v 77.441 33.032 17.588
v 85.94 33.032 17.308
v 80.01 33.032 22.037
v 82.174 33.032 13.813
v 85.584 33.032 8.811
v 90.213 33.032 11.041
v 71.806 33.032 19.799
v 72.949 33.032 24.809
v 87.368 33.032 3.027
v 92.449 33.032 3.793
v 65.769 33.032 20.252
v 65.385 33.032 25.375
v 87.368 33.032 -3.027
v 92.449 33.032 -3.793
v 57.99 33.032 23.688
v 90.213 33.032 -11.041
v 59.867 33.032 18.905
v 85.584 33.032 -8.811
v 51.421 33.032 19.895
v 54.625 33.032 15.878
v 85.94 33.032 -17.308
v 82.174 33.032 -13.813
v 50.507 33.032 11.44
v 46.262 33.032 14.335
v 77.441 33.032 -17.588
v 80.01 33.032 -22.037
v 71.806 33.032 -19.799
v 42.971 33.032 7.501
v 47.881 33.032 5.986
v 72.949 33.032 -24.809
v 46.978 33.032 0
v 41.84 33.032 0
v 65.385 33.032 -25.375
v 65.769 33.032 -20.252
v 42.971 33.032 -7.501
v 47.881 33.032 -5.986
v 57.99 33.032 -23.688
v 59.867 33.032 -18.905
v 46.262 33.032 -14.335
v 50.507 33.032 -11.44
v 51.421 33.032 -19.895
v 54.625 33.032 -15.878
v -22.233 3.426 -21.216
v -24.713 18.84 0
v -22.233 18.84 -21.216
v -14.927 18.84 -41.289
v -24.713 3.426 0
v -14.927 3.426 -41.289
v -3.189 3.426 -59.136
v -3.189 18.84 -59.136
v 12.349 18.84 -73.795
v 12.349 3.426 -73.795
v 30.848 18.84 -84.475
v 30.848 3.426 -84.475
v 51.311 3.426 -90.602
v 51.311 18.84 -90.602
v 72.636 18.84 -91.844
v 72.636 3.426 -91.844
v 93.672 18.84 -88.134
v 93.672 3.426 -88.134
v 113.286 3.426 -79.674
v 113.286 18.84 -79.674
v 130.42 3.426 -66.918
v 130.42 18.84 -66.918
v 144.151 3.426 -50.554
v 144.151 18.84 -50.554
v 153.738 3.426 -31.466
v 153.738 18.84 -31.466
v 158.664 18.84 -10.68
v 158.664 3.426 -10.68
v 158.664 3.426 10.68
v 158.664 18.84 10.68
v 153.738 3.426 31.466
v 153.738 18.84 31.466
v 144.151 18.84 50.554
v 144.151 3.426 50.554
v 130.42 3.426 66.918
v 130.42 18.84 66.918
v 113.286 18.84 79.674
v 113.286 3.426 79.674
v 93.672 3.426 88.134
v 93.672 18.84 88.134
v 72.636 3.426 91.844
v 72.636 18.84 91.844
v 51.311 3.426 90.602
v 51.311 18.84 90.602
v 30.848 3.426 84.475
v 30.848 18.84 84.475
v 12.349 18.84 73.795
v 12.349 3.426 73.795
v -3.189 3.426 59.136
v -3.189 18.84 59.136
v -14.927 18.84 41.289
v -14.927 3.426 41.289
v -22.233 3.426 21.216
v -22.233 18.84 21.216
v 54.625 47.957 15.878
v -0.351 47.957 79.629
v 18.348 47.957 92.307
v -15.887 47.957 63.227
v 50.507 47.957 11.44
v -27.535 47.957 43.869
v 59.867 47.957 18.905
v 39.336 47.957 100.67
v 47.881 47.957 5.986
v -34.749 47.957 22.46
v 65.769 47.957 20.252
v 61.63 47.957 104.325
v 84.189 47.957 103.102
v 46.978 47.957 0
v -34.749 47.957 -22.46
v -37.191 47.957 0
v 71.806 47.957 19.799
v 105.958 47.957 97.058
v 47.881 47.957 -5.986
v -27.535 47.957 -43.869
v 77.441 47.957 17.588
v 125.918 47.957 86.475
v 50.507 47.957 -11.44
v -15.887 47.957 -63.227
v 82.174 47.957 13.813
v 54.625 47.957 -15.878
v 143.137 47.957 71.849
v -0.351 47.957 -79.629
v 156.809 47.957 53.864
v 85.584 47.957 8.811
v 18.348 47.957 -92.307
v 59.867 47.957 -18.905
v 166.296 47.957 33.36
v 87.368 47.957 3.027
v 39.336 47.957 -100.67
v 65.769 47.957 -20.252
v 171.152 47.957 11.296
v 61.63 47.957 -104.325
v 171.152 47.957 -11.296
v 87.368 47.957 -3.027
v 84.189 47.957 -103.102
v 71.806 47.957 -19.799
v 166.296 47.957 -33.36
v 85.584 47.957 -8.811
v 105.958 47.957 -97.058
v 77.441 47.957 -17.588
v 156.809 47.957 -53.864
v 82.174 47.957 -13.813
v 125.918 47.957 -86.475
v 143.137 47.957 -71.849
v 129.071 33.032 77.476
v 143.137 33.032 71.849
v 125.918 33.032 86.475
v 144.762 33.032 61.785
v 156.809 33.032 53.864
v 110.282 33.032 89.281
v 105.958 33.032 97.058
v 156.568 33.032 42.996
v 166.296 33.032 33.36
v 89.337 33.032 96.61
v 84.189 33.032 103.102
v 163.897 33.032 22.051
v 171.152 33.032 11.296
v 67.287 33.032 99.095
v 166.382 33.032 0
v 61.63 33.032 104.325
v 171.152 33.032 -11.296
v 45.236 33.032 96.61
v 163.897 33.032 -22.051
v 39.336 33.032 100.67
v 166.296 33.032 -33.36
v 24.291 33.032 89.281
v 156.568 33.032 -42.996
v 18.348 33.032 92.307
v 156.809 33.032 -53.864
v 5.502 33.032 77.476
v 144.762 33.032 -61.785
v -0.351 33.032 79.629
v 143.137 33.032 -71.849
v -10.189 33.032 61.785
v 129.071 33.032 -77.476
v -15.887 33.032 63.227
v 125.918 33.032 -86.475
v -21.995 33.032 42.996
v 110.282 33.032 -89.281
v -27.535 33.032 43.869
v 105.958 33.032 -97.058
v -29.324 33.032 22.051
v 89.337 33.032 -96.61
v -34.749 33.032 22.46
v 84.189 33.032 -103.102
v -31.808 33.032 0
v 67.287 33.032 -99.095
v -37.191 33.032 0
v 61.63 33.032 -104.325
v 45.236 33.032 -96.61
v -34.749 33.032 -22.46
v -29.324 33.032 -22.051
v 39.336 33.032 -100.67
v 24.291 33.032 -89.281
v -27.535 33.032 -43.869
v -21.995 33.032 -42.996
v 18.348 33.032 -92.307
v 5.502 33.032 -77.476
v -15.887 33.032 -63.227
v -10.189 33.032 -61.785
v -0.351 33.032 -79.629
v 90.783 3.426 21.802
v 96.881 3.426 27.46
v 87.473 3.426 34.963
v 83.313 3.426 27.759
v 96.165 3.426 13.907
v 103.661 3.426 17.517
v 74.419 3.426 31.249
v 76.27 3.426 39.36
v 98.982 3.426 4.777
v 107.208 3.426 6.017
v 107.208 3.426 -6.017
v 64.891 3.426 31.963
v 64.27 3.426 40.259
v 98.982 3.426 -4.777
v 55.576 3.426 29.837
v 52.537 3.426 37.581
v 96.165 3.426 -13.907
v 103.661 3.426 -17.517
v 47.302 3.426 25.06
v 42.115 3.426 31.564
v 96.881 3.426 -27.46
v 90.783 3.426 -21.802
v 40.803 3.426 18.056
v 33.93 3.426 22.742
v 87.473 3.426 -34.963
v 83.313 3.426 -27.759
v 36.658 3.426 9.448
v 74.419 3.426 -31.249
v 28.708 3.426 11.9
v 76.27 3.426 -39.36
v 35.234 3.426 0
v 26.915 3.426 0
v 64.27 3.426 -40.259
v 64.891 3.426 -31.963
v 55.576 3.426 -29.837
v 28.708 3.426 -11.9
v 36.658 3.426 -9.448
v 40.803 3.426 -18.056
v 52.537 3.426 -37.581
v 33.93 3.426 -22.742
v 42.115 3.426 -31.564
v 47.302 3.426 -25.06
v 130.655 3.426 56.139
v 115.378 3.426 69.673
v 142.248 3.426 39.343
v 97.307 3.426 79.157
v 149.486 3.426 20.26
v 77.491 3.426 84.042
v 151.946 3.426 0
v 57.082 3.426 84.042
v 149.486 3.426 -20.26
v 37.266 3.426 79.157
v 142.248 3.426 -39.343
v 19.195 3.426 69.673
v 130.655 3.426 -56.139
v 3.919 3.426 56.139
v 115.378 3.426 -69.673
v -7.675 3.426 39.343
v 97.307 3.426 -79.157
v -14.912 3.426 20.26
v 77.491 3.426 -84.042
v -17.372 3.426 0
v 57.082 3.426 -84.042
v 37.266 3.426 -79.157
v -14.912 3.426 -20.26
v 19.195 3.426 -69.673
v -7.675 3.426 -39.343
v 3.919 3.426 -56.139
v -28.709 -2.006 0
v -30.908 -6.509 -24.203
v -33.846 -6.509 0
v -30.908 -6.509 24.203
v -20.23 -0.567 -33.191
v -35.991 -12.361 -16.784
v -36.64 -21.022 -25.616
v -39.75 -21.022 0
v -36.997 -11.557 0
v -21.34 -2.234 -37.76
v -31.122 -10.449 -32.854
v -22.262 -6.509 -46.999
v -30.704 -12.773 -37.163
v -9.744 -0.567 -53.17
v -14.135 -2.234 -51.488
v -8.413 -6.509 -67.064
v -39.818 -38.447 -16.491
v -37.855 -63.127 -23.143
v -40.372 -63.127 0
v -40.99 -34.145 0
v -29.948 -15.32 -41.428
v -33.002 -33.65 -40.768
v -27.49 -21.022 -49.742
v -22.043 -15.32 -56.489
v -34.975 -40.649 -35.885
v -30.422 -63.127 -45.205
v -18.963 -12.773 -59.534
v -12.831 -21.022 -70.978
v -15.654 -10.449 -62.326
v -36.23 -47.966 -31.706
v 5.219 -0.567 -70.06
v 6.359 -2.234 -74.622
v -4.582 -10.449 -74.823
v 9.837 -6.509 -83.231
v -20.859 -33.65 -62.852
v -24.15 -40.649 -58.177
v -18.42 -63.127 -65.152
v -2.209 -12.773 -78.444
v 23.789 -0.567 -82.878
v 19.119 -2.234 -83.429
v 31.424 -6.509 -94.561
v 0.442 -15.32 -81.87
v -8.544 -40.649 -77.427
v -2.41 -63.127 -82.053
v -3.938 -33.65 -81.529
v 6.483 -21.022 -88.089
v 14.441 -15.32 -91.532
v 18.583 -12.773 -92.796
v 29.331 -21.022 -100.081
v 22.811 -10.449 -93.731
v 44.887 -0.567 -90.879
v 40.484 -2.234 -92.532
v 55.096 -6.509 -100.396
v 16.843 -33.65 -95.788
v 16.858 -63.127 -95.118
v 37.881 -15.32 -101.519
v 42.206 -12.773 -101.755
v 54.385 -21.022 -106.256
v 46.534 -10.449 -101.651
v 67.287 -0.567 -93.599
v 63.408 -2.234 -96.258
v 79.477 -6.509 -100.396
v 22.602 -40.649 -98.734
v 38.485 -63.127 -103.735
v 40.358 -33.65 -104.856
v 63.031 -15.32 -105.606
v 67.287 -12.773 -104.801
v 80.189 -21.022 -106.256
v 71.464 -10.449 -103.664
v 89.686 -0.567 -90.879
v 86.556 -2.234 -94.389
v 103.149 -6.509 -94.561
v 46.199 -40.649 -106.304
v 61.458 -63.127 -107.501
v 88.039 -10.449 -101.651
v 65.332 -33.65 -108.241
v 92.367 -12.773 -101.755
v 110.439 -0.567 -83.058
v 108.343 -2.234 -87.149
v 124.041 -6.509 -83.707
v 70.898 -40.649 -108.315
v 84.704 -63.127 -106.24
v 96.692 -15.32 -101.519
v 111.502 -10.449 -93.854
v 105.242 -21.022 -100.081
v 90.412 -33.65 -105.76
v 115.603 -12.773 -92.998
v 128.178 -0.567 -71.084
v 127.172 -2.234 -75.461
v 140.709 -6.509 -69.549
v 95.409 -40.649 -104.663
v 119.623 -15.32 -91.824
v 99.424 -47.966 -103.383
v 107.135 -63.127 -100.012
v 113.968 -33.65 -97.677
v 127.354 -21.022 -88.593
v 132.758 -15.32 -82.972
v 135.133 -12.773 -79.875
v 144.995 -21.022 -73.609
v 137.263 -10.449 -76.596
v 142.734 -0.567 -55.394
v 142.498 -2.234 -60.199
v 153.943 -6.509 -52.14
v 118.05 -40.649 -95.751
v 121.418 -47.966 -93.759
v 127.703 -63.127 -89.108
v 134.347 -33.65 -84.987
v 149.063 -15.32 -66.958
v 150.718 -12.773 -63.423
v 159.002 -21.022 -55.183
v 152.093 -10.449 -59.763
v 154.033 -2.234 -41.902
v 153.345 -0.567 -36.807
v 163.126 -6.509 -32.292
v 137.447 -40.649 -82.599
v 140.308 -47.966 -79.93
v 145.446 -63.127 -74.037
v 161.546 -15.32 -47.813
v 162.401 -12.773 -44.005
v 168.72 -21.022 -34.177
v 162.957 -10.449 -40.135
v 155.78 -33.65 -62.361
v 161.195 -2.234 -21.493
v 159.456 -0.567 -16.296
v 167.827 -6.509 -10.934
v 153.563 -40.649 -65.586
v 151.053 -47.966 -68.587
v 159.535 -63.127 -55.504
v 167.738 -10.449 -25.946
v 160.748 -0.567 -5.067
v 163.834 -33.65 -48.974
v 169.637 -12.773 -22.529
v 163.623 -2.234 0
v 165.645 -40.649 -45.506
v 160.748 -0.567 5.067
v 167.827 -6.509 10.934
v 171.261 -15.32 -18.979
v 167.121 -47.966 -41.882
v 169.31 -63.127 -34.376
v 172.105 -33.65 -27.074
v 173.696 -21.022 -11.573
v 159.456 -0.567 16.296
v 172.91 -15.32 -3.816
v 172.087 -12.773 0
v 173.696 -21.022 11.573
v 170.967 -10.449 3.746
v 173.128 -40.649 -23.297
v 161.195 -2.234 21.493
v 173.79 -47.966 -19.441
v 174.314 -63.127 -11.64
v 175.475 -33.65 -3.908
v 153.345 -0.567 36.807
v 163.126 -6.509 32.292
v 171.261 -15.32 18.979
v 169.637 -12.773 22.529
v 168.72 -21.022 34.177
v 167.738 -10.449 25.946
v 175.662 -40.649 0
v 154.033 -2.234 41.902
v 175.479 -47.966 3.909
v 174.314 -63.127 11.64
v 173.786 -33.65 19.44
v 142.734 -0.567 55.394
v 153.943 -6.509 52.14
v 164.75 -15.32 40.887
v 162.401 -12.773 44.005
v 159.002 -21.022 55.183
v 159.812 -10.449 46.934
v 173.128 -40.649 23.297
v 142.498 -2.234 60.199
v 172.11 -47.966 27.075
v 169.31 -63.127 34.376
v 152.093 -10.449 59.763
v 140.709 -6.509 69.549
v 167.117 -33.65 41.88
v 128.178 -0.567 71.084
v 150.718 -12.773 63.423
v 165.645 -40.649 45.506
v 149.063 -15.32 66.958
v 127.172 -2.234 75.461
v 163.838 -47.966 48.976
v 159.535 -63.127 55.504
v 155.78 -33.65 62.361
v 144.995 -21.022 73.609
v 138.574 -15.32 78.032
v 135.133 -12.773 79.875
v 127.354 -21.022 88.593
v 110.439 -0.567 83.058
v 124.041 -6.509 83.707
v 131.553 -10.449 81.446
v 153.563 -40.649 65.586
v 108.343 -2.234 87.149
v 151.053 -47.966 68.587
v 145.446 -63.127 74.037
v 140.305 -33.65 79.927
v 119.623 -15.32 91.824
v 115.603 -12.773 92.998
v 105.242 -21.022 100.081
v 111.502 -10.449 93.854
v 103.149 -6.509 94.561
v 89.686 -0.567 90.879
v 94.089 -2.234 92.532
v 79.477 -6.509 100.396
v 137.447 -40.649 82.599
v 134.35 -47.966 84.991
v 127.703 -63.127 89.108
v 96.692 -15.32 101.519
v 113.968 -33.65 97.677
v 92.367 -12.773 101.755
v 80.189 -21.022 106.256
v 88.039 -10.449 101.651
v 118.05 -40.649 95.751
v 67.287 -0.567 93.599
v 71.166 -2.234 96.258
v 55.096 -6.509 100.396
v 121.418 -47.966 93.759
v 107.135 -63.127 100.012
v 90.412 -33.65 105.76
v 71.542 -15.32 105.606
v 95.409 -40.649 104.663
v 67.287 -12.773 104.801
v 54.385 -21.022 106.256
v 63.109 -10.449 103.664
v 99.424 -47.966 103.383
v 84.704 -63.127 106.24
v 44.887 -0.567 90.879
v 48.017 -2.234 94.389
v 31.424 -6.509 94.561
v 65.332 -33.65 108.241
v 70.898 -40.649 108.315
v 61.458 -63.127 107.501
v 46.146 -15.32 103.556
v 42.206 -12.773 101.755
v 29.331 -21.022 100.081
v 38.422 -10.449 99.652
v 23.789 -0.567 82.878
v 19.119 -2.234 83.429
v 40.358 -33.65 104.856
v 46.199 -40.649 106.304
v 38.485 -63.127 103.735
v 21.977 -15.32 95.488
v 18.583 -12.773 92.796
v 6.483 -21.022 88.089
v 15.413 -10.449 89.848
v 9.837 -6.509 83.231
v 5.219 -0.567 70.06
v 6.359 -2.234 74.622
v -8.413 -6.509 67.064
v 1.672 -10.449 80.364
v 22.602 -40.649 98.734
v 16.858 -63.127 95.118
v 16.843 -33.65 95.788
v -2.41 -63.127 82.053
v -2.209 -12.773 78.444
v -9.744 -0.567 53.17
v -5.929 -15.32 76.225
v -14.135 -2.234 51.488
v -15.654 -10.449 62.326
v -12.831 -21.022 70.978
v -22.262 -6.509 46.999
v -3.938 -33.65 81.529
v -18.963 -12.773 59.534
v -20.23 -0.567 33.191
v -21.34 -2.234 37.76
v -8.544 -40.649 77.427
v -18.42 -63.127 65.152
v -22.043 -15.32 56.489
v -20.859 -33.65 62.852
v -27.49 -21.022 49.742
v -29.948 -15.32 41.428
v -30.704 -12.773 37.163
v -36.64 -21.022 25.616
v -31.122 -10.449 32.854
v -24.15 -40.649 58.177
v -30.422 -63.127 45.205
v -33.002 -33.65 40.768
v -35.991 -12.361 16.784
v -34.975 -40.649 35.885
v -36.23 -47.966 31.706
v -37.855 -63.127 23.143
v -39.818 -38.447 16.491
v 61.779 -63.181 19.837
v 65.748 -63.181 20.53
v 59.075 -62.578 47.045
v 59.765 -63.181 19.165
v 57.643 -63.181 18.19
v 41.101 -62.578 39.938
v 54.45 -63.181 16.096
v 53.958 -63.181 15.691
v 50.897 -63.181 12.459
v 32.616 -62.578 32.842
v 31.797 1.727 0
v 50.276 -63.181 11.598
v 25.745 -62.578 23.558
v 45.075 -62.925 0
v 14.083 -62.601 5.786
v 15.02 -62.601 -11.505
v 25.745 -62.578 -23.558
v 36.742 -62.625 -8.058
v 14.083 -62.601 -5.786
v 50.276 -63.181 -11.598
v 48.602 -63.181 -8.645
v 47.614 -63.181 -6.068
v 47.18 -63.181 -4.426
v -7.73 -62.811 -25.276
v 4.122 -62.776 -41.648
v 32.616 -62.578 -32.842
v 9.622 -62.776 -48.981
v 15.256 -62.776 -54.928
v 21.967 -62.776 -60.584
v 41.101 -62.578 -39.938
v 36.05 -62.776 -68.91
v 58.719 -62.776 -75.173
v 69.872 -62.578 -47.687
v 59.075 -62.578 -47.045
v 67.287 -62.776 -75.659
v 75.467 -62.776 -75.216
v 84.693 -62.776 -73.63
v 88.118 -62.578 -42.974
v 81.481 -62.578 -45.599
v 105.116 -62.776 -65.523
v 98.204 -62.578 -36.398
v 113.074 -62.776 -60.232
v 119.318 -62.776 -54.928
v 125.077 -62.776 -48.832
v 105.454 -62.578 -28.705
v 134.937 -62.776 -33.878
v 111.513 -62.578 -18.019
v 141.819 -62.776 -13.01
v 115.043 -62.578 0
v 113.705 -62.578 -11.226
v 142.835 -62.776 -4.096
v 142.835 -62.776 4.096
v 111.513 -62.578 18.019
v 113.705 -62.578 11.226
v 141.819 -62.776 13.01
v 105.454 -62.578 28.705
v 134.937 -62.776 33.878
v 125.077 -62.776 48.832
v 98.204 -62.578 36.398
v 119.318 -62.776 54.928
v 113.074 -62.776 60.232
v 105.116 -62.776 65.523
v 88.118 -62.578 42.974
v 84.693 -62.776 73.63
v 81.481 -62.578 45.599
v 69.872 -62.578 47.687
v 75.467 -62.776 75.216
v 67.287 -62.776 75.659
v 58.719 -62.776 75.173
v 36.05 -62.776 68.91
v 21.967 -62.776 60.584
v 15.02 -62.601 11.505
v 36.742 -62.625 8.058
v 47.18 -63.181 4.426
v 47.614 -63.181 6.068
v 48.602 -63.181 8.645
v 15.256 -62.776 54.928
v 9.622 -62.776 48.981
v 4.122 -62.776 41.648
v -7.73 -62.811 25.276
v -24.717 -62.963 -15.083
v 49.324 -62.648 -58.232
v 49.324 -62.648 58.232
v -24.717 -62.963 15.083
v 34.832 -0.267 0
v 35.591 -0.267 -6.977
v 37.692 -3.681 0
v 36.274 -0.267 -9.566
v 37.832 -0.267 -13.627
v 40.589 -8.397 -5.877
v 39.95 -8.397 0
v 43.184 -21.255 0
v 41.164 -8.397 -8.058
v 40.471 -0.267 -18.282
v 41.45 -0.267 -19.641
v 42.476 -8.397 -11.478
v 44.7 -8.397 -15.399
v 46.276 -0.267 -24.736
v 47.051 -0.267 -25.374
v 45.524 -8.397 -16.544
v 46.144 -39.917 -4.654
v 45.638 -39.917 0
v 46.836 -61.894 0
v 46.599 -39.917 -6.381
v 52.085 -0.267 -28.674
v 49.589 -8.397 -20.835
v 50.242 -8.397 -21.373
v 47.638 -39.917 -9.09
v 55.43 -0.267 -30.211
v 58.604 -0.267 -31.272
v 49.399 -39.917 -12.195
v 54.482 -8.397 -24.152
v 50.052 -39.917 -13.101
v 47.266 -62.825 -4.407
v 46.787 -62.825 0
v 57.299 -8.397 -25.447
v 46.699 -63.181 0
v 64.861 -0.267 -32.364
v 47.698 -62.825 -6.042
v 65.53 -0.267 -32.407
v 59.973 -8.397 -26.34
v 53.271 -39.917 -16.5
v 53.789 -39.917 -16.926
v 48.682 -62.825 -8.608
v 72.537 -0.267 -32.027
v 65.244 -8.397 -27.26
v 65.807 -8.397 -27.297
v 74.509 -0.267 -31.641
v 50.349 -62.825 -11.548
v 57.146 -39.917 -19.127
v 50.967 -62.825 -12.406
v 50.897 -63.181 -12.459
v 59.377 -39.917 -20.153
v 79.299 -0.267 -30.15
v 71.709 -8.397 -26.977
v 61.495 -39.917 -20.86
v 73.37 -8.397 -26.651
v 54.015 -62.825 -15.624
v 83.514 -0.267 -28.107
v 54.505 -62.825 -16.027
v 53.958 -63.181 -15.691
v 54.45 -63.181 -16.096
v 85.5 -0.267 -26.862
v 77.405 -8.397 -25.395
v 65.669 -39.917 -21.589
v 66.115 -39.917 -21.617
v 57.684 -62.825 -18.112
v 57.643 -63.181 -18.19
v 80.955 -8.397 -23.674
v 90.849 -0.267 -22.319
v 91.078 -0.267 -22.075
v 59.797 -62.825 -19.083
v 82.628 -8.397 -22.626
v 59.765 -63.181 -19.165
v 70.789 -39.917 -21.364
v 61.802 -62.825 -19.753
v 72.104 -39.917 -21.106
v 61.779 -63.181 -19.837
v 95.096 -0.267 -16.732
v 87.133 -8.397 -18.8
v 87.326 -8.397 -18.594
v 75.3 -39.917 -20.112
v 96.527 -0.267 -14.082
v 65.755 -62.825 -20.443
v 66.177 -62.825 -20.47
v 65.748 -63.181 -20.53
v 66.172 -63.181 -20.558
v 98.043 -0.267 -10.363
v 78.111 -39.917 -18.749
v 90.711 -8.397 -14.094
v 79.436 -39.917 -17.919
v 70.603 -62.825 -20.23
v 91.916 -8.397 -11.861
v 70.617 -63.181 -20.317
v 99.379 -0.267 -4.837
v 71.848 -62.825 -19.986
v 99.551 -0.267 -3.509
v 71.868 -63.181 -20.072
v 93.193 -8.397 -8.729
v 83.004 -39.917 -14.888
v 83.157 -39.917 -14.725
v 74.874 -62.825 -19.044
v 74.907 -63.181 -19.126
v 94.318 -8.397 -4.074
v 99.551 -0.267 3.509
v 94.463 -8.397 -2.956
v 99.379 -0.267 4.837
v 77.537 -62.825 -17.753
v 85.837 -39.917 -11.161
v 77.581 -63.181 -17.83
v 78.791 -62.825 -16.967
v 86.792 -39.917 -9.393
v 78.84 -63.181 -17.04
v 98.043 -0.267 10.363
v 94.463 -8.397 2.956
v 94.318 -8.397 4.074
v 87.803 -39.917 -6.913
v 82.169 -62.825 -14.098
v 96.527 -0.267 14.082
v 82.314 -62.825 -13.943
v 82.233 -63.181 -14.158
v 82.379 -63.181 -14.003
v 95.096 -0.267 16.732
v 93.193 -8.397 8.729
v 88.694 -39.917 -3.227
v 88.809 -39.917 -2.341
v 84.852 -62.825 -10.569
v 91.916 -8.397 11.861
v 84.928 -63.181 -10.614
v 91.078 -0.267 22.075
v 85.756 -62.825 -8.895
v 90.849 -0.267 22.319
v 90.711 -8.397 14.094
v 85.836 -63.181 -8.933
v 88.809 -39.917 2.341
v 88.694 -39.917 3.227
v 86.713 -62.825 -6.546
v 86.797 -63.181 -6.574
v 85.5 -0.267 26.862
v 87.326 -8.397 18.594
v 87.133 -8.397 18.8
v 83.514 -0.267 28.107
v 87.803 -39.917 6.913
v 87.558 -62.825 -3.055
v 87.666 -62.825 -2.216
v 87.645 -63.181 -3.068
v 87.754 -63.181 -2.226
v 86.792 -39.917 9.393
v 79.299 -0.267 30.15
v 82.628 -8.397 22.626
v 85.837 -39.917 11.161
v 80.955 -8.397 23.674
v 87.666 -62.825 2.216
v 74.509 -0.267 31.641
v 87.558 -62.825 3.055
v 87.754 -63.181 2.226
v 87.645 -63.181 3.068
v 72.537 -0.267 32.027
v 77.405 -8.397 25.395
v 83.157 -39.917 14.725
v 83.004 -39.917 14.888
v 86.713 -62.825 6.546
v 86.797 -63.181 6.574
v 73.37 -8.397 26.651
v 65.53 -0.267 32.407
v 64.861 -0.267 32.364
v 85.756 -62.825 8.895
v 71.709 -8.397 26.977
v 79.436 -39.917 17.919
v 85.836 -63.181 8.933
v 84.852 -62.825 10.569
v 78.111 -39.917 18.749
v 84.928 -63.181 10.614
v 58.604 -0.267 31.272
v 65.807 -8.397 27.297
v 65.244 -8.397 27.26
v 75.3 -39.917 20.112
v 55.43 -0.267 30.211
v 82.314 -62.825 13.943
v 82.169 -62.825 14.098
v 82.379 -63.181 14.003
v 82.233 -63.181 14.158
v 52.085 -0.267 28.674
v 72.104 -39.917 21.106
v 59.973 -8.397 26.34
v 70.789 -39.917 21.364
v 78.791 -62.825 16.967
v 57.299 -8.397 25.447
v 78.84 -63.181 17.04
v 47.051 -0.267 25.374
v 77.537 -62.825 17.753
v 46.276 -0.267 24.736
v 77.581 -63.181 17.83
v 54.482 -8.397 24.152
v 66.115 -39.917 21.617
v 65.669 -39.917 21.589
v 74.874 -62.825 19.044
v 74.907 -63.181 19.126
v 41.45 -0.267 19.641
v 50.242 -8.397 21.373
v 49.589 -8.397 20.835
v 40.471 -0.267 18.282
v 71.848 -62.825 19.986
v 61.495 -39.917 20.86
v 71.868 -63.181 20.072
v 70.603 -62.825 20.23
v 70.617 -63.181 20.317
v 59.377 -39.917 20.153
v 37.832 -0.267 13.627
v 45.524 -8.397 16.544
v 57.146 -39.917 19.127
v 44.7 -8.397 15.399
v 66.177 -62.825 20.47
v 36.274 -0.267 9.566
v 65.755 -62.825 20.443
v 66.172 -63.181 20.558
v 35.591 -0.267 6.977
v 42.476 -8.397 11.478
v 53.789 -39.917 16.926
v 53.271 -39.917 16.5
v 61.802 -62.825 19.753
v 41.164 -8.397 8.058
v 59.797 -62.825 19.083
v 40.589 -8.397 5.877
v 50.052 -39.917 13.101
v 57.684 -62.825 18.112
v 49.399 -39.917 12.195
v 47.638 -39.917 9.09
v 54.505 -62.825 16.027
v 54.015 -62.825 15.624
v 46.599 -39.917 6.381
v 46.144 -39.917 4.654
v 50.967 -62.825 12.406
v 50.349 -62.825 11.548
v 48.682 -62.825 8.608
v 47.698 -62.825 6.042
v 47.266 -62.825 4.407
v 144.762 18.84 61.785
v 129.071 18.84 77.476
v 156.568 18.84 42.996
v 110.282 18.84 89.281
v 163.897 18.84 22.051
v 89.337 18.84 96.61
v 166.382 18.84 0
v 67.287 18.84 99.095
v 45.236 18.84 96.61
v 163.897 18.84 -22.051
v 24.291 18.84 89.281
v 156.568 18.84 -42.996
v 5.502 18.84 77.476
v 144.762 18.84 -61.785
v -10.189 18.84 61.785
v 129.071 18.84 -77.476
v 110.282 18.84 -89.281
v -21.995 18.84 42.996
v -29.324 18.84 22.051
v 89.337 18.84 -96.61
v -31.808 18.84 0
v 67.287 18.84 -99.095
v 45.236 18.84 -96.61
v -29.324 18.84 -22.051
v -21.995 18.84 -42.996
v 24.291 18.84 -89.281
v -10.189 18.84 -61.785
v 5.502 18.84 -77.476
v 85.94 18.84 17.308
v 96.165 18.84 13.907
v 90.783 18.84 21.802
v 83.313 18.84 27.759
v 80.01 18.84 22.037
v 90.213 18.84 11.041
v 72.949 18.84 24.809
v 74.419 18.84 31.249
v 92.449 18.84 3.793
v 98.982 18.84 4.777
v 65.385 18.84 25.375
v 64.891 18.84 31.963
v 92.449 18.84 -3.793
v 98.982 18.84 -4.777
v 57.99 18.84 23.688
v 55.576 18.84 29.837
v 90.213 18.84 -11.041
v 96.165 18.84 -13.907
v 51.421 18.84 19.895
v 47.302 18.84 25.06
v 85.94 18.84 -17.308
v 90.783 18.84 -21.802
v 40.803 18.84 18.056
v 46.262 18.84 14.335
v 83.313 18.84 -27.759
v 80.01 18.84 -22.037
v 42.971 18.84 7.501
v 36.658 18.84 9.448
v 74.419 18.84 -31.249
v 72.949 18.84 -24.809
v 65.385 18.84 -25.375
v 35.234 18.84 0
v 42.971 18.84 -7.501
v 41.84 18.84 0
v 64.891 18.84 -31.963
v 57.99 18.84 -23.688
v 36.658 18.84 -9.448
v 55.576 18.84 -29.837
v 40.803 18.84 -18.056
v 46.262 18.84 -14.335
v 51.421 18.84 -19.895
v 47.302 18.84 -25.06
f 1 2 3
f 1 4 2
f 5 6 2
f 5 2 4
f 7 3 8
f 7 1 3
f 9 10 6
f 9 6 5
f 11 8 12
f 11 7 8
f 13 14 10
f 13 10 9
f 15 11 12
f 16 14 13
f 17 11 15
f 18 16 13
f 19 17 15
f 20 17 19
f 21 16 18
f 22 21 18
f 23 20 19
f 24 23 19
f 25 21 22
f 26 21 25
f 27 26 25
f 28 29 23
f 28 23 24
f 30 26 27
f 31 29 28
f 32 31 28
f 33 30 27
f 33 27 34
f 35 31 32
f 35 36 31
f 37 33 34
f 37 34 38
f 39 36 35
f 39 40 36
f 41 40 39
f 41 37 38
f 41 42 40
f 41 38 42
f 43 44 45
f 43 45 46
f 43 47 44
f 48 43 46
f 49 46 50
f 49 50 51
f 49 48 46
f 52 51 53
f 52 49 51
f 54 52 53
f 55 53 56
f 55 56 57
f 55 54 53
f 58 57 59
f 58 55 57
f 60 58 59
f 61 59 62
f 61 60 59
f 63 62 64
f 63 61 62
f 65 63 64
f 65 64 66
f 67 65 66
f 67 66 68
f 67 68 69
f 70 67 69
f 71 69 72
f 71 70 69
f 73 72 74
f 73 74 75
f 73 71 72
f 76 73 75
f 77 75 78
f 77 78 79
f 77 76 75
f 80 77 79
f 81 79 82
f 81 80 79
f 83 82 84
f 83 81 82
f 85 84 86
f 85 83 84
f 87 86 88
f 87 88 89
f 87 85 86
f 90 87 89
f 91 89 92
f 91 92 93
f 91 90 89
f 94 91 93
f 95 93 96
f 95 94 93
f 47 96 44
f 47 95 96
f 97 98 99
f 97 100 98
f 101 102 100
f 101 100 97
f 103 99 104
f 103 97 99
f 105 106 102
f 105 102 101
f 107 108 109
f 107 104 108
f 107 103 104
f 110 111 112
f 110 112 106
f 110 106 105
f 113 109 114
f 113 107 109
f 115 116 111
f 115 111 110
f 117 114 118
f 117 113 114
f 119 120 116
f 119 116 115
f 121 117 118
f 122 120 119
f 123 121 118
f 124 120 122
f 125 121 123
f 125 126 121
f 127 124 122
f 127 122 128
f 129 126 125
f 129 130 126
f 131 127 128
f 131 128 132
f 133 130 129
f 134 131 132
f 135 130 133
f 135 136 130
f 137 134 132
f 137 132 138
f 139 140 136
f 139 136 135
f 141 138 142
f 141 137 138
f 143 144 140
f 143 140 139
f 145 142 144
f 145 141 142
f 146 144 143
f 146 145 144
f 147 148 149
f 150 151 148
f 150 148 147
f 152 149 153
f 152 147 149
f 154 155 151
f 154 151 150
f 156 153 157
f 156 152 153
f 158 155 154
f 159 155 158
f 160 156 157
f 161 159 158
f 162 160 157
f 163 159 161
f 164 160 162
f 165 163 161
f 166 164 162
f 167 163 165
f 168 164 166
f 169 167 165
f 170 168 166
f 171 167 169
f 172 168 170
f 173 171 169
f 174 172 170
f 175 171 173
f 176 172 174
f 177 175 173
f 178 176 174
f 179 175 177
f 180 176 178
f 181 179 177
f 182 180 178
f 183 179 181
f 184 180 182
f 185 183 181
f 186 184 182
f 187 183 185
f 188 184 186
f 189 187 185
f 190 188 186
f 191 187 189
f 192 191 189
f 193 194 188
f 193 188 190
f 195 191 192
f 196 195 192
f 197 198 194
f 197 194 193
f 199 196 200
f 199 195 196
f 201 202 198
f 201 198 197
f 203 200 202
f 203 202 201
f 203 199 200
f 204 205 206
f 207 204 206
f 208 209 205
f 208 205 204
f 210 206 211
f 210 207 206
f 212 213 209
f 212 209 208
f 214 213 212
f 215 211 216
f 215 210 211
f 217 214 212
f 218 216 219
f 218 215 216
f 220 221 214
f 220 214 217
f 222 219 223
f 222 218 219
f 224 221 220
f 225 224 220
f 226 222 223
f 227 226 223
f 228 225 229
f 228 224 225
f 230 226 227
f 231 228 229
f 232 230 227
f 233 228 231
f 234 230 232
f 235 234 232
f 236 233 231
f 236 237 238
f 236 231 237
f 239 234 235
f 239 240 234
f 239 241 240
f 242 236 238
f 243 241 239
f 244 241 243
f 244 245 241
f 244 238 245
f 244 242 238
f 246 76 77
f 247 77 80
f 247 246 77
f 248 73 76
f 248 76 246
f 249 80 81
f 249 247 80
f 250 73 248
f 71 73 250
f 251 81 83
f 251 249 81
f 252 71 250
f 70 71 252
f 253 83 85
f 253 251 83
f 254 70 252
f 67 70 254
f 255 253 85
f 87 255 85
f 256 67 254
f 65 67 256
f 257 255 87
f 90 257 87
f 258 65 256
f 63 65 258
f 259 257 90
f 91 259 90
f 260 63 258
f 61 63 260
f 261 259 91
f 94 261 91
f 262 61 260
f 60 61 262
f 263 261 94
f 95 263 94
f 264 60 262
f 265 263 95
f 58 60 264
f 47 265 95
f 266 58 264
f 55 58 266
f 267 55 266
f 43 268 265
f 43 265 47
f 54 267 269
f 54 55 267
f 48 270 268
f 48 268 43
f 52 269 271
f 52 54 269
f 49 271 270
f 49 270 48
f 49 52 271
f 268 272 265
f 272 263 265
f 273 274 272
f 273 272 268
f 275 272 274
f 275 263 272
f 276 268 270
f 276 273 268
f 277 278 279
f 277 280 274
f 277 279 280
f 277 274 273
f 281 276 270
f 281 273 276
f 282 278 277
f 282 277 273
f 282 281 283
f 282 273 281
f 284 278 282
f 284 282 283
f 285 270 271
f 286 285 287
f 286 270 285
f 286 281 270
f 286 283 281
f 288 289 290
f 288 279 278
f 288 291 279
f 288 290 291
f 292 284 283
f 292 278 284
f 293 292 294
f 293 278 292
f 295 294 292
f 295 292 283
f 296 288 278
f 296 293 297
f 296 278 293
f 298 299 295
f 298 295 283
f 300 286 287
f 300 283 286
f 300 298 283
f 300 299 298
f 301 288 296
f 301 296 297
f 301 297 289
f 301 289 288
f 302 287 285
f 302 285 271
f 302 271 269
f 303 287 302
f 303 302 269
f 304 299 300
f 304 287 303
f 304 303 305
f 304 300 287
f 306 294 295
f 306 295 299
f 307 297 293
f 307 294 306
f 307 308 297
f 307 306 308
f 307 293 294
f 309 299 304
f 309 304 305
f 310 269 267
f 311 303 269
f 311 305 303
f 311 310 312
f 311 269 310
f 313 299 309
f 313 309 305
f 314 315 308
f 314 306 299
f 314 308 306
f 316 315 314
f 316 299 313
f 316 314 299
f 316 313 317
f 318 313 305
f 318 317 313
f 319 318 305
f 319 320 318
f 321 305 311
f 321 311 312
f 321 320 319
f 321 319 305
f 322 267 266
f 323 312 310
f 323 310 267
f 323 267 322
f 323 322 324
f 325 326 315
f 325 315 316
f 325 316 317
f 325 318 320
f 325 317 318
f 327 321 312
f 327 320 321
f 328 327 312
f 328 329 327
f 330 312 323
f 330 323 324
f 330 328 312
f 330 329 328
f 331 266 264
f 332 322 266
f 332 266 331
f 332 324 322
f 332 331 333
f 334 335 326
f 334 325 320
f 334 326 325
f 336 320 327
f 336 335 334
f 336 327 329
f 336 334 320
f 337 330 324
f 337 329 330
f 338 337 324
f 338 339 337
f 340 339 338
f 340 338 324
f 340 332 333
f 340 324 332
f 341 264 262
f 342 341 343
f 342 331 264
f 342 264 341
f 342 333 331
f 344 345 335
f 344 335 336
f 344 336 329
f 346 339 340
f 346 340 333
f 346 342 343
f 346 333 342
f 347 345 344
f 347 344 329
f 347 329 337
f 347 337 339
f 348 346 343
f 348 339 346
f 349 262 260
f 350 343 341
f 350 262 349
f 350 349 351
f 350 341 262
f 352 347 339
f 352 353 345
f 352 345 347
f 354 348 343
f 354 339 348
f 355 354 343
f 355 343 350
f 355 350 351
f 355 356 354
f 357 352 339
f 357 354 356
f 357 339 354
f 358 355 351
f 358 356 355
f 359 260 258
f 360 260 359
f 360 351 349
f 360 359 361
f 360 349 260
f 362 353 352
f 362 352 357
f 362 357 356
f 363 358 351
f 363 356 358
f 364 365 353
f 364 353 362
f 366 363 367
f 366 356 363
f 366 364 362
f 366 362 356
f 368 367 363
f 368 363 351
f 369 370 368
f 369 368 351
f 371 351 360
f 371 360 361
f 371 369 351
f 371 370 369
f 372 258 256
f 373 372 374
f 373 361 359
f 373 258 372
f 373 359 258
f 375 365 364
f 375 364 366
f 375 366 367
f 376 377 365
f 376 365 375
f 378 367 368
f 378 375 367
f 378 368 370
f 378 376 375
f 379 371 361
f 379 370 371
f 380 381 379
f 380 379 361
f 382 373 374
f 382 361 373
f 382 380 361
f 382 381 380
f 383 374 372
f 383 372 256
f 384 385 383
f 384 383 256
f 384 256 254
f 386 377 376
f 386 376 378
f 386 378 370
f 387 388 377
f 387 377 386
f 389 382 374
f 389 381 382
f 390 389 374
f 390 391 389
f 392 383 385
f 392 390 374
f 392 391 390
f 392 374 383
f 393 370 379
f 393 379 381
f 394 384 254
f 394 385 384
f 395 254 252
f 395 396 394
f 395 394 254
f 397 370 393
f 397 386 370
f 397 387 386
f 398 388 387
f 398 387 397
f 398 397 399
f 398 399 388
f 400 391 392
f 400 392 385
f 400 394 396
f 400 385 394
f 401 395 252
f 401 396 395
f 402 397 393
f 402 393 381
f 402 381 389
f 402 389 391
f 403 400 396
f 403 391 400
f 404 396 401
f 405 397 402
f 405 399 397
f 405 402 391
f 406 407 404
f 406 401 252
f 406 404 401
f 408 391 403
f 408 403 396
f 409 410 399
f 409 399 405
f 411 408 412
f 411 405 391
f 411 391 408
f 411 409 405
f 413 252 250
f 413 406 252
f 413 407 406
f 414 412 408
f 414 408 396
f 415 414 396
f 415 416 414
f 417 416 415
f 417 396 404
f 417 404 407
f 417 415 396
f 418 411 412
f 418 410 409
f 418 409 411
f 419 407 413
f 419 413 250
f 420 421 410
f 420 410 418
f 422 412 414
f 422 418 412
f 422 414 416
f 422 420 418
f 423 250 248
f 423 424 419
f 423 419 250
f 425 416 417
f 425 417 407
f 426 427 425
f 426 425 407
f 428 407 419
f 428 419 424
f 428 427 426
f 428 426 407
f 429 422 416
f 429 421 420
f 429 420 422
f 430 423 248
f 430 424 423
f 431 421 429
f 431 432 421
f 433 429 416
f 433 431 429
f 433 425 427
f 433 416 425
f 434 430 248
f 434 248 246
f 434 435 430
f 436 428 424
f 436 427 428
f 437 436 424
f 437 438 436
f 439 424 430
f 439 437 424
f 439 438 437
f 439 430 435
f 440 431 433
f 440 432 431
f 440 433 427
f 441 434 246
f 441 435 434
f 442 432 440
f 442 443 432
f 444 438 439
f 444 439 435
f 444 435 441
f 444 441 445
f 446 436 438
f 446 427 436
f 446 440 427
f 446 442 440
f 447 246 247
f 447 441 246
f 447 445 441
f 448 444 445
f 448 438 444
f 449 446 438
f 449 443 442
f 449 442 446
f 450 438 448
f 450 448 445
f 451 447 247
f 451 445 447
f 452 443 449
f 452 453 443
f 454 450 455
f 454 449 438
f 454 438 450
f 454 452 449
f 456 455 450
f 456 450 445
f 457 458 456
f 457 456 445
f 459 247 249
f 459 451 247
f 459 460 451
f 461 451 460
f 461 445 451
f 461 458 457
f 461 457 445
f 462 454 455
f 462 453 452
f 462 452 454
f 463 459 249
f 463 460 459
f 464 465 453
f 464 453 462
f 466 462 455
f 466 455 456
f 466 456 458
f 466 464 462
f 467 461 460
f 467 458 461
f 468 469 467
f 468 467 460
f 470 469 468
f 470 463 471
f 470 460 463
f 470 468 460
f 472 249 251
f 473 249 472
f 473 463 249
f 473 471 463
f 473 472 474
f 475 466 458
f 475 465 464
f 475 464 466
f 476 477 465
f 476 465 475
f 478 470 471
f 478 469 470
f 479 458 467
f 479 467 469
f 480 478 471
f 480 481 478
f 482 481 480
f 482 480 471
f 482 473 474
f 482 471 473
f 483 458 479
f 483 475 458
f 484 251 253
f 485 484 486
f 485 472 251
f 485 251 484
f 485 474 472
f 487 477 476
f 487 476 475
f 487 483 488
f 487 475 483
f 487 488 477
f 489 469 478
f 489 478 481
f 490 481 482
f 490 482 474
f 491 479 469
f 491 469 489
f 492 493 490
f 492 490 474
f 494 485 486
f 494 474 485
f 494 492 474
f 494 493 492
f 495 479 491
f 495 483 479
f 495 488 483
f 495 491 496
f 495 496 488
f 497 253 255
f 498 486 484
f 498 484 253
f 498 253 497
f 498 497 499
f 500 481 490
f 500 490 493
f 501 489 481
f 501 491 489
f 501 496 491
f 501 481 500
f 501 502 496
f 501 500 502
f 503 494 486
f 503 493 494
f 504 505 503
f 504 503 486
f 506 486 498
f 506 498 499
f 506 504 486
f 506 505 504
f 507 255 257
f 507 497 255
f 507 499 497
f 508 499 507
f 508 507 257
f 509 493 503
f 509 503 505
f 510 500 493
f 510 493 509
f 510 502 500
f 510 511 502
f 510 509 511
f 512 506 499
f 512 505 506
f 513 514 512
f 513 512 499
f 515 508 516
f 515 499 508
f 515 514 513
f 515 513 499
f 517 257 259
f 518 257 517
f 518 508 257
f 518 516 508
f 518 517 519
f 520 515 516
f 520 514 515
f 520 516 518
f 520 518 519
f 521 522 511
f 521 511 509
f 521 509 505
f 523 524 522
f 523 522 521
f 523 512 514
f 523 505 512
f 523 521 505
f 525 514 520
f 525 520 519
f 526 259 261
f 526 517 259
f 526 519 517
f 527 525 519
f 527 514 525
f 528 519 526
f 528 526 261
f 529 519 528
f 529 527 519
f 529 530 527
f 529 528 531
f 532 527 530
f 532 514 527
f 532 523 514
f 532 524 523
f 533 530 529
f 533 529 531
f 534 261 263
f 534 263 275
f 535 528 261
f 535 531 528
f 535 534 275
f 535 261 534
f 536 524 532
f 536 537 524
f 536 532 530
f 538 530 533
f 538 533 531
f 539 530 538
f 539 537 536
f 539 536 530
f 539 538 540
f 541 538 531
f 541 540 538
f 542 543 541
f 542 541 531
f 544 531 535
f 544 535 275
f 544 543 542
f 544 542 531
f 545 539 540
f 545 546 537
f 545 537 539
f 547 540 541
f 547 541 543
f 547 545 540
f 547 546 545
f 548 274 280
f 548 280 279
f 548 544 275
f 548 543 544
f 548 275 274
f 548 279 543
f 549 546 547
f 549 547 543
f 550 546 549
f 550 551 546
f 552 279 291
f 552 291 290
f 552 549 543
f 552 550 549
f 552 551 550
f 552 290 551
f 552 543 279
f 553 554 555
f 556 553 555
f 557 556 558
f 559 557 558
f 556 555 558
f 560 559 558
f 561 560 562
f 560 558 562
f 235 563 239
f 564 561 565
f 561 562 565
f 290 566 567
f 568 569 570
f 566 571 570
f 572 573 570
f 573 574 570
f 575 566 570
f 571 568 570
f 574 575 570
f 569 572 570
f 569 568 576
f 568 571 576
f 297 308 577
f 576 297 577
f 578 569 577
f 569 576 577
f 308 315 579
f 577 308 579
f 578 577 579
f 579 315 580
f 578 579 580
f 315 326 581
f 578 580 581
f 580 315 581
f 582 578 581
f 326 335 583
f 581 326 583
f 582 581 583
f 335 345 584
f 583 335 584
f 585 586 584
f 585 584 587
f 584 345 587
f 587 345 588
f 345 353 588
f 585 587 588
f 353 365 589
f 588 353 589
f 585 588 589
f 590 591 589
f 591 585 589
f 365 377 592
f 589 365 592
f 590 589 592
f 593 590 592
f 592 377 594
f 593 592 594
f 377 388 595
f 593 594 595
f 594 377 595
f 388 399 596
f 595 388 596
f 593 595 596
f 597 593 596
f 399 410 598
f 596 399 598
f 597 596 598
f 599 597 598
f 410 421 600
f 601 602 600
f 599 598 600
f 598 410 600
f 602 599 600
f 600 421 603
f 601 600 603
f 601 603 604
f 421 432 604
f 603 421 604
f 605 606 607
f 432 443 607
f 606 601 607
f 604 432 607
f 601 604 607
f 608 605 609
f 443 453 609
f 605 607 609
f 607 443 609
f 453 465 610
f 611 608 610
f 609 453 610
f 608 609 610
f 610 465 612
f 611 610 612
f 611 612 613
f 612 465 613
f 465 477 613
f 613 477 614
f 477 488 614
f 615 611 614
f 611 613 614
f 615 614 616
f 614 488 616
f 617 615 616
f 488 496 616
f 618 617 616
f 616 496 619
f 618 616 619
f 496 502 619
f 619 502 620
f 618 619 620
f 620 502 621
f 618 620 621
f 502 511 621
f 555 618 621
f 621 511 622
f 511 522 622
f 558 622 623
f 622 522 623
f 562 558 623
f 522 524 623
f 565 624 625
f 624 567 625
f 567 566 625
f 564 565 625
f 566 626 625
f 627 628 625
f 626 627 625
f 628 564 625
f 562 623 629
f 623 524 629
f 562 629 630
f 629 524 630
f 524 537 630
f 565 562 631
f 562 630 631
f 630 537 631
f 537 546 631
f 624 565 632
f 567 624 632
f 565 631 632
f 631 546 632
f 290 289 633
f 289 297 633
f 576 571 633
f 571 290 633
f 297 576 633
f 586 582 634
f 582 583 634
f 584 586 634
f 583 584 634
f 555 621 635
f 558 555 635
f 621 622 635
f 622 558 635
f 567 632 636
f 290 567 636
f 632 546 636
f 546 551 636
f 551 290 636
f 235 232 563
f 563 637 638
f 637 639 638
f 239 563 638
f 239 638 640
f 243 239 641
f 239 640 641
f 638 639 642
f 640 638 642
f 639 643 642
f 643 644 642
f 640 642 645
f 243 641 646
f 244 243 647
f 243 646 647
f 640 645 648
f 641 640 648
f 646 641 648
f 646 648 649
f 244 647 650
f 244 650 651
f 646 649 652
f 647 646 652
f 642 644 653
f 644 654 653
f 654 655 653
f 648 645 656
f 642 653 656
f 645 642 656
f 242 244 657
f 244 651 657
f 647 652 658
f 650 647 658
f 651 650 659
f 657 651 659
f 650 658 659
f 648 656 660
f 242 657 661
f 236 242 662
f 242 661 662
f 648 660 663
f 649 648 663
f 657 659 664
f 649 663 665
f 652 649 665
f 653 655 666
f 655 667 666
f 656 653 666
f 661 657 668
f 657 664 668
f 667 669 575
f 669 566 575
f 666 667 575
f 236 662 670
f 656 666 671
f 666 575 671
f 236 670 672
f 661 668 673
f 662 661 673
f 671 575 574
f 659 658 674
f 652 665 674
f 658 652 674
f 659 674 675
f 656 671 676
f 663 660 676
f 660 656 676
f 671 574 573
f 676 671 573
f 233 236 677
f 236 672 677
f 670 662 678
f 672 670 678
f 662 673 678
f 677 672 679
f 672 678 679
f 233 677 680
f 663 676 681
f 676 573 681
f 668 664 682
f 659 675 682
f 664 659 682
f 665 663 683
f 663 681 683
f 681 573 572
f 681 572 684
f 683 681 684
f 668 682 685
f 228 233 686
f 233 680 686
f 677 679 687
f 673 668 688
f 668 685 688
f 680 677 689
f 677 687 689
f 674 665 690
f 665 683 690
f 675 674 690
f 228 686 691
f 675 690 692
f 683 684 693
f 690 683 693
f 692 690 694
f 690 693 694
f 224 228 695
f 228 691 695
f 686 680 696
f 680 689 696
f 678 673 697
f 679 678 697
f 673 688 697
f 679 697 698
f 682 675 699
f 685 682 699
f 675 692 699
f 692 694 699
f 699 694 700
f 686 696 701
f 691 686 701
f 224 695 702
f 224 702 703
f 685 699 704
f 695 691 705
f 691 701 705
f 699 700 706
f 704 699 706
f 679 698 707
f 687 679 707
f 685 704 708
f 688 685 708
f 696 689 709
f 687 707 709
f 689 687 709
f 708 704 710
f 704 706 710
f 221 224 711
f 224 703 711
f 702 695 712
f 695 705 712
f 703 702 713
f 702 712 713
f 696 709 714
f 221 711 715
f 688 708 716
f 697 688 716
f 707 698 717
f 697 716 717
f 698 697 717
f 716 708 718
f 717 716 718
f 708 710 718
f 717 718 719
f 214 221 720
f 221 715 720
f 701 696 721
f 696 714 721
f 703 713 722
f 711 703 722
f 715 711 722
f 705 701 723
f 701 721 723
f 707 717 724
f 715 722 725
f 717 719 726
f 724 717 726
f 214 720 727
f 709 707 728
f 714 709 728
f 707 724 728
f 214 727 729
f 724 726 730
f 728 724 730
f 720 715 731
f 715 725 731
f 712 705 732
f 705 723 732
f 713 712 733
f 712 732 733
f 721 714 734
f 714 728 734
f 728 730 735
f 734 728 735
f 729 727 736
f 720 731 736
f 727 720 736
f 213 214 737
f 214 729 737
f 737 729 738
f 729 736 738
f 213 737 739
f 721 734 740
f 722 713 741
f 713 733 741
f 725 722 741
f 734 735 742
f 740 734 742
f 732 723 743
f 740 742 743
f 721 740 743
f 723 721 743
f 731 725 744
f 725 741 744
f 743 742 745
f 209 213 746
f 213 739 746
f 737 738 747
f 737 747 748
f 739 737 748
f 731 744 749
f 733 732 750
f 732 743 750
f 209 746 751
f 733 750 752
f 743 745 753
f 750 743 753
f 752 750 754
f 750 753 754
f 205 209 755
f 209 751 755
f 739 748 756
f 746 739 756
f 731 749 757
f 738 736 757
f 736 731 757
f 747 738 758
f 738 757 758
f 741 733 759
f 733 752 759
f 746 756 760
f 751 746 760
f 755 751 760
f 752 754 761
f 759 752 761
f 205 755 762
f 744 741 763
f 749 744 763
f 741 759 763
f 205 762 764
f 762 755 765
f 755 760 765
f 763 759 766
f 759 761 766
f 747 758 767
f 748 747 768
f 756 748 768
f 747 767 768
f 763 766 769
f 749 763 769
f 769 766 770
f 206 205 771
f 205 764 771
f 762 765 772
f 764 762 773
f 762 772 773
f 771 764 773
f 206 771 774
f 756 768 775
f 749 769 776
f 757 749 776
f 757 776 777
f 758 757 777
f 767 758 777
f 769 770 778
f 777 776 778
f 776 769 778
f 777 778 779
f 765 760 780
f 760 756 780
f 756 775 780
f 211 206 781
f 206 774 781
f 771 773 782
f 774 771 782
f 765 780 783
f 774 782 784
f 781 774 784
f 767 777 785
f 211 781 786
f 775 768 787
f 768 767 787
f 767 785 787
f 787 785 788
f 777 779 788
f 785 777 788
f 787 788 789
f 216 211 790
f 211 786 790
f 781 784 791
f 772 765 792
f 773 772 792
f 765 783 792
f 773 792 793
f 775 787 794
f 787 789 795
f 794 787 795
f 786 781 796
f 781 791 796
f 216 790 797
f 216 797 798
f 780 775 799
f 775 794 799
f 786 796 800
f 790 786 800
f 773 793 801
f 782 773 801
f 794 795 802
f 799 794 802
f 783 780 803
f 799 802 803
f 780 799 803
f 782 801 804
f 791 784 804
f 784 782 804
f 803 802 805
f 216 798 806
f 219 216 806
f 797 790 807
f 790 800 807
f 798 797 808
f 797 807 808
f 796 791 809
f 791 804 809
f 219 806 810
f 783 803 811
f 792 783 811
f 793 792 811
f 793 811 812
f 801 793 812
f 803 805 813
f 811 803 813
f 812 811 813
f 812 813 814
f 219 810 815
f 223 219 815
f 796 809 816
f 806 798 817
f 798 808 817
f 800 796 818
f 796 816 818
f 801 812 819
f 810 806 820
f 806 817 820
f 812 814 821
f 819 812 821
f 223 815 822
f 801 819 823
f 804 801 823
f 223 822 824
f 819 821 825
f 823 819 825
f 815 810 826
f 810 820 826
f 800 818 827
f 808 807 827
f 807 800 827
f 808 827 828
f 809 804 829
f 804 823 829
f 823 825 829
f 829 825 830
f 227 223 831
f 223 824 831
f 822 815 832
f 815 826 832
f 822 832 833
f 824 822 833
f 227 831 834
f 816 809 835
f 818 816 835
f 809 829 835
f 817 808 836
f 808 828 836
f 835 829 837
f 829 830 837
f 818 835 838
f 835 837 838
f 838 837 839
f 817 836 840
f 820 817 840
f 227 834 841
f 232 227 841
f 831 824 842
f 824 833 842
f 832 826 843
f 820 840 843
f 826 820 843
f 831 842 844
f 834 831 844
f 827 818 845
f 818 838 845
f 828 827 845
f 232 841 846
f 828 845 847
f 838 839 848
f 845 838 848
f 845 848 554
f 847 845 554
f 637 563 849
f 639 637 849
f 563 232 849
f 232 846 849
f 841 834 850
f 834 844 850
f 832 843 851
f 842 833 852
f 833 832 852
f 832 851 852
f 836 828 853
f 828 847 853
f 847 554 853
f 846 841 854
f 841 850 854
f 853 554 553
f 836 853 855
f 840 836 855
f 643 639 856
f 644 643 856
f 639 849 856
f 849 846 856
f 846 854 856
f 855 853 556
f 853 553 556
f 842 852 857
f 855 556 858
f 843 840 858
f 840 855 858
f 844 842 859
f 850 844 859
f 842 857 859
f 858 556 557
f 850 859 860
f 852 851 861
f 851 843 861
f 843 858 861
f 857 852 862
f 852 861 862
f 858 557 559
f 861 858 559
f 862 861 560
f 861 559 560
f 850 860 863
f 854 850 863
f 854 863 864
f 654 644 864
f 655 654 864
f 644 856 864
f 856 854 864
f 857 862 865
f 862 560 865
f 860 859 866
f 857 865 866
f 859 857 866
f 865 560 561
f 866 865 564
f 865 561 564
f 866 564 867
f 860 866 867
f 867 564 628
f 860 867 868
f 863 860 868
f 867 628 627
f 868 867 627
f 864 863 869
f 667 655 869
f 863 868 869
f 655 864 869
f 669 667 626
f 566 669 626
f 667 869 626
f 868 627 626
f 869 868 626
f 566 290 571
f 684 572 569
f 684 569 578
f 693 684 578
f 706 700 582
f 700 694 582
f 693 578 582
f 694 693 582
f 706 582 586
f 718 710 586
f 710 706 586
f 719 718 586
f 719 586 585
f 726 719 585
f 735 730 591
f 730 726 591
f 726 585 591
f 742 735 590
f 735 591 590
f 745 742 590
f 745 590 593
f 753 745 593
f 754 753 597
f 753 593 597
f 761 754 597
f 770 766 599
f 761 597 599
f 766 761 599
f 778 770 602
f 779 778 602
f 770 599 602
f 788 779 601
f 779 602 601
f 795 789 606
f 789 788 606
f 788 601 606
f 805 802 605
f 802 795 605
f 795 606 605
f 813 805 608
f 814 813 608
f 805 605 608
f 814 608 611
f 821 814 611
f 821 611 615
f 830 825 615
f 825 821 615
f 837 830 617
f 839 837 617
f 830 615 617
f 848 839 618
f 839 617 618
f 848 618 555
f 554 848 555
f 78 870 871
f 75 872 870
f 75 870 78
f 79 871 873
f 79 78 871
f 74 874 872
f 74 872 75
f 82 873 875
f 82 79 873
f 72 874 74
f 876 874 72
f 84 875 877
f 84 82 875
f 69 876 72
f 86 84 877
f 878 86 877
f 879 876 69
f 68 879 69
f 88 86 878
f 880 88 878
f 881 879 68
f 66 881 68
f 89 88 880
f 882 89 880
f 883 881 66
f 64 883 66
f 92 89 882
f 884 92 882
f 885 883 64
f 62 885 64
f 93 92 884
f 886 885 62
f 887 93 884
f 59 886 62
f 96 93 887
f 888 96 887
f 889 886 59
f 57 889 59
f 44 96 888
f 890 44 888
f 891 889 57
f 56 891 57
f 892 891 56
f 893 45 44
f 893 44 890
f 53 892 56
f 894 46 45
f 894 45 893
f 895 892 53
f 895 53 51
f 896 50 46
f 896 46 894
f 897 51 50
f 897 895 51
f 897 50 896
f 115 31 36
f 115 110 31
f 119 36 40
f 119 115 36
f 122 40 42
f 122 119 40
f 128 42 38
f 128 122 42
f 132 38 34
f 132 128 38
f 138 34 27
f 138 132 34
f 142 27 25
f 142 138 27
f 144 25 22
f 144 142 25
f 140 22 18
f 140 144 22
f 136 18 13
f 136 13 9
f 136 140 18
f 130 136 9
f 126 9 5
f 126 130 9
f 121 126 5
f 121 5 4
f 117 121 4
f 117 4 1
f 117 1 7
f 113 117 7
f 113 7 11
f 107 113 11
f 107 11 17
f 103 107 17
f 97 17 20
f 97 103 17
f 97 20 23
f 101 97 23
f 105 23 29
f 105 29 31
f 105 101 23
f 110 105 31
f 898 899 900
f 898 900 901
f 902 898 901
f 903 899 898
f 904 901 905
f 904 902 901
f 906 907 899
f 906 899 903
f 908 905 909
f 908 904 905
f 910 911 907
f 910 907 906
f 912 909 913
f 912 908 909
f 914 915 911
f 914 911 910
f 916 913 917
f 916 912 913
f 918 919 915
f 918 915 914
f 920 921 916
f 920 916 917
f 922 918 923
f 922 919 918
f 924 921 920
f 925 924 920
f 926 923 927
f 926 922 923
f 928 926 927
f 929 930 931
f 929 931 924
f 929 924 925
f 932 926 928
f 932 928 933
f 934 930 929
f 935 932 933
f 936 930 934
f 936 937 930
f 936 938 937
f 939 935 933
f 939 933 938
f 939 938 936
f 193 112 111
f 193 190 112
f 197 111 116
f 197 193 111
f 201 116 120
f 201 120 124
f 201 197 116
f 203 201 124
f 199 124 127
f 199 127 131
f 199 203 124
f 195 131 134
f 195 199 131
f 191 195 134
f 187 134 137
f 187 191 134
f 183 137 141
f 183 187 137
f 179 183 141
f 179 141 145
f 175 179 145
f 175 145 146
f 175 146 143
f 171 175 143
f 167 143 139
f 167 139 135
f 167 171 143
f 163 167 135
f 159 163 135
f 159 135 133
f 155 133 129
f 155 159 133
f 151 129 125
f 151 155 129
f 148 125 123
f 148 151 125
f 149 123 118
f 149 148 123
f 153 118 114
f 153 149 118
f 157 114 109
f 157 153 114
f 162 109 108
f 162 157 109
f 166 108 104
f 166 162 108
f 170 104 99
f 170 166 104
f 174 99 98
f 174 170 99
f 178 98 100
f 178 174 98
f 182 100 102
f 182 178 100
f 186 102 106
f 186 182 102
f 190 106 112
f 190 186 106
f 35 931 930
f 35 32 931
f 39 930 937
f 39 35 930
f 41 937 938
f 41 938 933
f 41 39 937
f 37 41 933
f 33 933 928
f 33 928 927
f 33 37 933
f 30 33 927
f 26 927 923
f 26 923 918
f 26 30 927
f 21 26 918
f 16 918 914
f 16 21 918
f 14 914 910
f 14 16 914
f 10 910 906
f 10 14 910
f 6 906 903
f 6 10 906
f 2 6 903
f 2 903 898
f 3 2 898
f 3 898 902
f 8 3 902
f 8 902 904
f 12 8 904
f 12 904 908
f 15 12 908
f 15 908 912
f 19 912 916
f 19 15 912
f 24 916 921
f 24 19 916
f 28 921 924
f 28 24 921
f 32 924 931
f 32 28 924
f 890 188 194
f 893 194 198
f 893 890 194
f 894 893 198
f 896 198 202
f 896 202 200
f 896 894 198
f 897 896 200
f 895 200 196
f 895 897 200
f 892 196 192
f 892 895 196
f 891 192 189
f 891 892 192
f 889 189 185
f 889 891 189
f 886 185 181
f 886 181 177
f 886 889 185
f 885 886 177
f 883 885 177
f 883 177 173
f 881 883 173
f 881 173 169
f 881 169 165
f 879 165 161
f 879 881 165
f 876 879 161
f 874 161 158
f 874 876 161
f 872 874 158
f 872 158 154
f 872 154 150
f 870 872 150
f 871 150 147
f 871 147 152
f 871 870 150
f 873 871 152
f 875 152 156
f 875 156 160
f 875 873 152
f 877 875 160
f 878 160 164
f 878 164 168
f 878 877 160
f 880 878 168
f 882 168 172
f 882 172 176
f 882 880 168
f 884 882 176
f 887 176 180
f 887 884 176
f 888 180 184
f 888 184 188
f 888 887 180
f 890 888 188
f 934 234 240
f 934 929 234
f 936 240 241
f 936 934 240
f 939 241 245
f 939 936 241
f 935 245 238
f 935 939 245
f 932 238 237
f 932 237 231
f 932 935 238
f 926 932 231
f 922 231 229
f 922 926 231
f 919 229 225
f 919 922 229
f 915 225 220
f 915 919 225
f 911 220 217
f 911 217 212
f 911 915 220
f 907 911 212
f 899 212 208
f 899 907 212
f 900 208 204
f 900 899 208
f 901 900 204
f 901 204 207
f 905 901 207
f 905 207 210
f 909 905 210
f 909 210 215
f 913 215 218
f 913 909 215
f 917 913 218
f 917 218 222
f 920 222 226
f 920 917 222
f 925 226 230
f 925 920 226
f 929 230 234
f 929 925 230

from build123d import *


with BuildPart() as f1:
    # F0 (on Top) → F1 (revolve)
    with BuildSketch(Plane.XY):
        Polygon((46.9783507288, 47.9570627213), (-37.1911935508, 47.9570627213), (-37.1911935508, 33.0316498876), (-31.808257103, 33.0316498876), (41.840095073, 33.0316498876), (46.9783507288, 33.0316498876), align=None)
        with BuildLine():
            Line((26.914678514, 3.4255045466), (-17.3722021282, 3.4255045466))
            add(Edge.make_bspline(
                [(-17.3722021282, 3.4255045466), (-24.6032634919, 0.5350989453), (-42.97008984, -6.8065034953), (-41.3526611202, -41.8689055569), (-40.372017771, -63.1271600723)],
                knots=[0, 0, 0, 0, 0.3937022775, 1, 1, 1, 1], degree=3))
            add(Edge.make_bspline(
                [(26.914678514, 3.4255045466), (31.6067703889, 2.1012831856), (44.8582918282, -1.6386153976), (47.4232161342, -64.0710102025), (45.7399405329, -62.1356415294), (1.5709073955, -62.6442168335), (-40.372017771, -63.1271600723)],
                knots=[0, 0, 0, 0, 0.1916852787, 0.5413622852, 0.5644775087, 1, 1, 1, 1], degree=3))
        make_face()
        Polygon((41.840095073, 33.0316498876), (-31.808257103, 33.0316498876), (-31.808257103, 18.8402757049), (-24.7125700116, 18.8402757049), (35.2337621152, 18.8402757049), (41.840095073, 18.8402757049), align=None)
        Polygon((35.2337621152, 18.8402757049), (-24.7125700116, 18.8402757049), (-24.7125700116, 3.4255045466), (-17.3722021282, 3.4255045466), (26.914678514, 3.4255045466), (35.2337621152, 3.4255045466), align=None)
    revolve(axis=Axis((67.2867000103, -2.9361471534, 0), (0, -1, 0)))


solid = f1.part
